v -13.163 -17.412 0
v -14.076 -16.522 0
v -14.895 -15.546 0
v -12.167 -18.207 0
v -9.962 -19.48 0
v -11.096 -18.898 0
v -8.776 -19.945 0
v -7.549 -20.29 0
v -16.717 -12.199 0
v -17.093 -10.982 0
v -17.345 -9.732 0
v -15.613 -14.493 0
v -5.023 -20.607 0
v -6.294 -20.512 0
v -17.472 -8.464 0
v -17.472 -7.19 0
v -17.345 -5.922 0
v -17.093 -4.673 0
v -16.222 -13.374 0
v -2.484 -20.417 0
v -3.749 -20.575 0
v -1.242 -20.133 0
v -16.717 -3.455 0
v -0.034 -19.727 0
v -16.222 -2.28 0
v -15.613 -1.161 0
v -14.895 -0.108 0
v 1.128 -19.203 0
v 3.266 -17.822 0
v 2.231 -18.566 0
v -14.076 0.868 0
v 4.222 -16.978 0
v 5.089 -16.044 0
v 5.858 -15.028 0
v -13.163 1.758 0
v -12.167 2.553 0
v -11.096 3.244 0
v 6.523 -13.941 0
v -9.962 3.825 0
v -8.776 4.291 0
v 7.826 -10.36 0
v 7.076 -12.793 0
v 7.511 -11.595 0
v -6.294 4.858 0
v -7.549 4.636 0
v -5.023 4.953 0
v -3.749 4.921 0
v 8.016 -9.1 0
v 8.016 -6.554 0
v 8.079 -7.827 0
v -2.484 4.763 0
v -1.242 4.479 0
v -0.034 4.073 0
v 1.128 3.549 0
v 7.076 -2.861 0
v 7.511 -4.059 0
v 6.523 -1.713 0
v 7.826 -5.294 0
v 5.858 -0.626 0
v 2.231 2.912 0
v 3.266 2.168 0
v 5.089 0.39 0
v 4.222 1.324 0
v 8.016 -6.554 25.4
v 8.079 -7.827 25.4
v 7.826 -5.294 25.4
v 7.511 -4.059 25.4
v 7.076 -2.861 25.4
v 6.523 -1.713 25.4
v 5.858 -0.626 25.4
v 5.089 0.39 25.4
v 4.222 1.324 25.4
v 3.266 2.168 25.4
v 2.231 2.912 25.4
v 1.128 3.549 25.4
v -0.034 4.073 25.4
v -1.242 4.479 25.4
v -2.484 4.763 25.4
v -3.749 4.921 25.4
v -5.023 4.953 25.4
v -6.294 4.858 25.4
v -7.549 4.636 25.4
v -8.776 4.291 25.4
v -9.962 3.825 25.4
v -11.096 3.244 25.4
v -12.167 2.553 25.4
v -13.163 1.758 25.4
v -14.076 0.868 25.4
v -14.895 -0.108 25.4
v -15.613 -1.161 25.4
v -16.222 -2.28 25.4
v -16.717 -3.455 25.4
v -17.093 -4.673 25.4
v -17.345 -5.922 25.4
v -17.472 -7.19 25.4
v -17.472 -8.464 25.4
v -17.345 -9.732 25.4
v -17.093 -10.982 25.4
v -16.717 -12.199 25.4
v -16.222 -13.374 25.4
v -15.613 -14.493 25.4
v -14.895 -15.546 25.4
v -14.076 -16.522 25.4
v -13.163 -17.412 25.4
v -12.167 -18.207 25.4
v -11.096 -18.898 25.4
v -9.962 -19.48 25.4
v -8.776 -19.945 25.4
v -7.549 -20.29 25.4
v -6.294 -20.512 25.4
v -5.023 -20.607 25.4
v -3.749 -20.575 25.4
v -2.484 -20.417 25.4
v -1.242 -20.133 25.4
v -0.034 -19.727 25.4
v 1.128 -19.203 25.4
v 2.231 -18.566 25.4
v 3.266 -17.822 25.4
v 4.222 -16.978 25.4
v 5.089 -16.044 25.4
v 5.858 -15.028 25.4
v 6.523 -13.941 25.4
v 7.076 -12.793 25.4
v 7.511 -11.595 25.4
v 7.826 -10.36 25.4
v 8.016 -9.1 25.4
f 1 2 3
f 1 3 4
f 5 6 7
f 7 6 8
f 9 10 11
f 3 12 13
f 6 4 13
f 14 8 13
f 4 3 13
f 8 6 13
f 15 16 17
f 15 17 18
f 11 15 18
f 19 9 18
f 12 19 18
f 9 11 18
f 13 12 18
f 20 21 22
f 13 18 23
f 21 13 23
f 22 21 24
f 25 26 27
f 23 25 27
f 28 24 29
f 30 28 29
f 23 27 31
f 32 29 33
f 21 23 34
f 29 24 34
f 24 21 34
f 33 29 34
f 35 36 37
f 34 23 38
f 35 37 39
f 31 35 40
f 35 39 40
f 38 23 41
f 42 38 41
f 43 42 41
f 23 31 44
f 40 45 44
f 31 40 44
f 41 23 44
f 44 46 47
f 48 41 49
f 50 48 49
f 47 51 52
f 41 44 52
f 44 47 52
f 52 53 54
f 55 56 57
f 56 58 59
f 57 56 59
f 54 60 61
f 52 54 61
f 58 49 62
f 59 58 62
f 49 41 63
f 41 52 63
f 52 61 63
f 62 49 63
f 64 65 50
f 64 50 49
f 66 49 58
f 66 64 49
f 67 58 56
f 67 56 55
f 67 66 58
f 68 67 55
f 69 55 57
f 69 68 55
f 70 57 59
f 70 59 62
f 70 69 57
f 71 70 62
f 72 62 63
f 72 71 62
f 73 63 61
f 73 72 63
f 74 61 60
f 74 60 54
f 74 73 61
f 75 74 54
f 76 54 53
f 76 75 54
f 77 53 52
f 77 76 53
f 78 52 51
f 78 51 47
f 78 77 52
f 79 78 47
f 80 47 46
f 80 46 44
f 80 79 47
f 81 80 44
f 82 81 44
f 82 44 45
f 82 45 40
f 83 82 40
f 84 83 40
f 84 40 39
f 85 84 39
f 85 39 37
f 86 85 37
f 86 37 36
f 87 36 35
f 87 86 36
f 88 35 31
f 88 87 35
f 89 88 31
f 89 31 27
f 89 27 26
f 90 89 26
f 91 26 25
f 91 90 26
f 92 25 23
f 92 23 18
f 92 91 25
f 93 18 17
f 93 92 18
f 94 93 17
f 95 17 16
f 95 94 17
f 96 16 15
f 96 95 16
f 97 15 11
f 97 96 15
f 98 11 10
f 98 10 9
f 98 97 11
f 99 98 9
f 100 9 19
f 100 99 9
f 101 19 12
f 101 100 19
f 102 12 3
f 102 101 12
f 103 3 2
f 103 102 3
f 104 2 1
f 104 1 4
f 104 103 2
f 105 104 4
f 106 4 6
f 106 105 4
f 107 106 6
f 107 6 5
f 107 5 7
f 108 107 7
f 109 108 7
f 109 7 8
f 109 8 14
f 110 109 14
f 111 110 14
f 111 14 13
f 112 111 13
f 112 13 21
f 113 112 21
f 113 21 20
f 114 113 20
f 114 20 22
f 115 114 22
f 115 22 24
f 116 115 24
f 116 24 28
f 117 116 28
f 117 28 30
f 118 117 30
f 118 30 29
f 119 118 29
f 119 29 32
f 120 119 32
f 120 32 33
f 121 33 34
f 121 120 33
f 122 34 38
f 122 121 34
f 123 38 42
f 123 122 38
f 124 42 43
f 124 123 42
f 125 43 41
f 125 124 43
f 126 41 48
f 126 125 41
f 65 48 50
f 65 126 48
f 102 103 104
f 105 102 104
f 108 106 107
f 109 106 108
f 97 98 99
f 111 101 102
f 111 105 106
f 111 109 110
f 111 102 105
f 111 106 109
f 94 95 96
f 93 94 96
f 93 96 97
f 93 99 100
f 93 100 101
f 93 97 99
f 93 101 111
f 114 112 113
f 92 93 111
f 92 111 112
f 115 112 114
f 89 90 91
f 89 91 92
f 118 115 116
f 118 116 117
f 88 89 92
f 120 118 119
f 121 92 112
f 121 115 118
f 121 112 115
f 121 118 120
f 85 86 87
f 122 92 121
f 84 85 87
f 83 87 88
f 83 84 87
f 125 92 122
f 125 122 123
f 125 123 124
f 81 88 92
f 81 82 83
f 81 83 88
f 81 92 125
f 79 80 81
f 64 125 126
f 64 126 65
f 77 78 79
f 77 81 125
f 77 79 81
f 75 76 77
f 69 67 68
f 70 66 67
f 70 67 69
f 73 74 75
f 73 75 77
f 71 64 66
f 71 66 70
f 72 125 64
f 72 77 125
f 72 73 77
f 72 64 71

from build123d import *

# Parameters (mm, degrees)
F0_W     = 69.465278
F0_H     = 106.150199
F1_DEPTH = 25.4
F2_R     = 5.08
F3_R     = 12.783767
F4_DEPTH = 25.4


with BuildPart() as f1:
    # F0 (on Top) → F1 (new body)
    with BuildSketch(Plane.XY):
        with Locations((-1.492229, 2.367309)):
            Rectangle(F0_W, F0_H)
    extrude(amount=F1_DEPTH)

    # F2
    f2_edges = [f1.edges().sort_by_distance(p)[0] for p in [
        (33.24041, 2.367308, 25.4),
        (-1.492229, -50.707791, 25.4),
        (-36.224868, 2.367308, 25.4),
        (-1.492229, 55.442408, 25.4),
        (33.24041, -50.707791, 12.7),
        (33.24041, 55.442408, 12.7),
        (-36.224868, -50.707791, 12.7),
        (-36.224868, 55.442408, 12.7),
    ]]
    fillet(f2_edges, radius=F2_R)

    # F3 (on face) → F4 (intersect)
    with BuildSketch(Plane.XY.offset(25.4)):
        with Locations((-4.704368, -7.827024)):
            Circle(F3_R)
    extrude(amount=-F4_DEPTH, mode=Mode.INTERSECT)


solid = f1.part
